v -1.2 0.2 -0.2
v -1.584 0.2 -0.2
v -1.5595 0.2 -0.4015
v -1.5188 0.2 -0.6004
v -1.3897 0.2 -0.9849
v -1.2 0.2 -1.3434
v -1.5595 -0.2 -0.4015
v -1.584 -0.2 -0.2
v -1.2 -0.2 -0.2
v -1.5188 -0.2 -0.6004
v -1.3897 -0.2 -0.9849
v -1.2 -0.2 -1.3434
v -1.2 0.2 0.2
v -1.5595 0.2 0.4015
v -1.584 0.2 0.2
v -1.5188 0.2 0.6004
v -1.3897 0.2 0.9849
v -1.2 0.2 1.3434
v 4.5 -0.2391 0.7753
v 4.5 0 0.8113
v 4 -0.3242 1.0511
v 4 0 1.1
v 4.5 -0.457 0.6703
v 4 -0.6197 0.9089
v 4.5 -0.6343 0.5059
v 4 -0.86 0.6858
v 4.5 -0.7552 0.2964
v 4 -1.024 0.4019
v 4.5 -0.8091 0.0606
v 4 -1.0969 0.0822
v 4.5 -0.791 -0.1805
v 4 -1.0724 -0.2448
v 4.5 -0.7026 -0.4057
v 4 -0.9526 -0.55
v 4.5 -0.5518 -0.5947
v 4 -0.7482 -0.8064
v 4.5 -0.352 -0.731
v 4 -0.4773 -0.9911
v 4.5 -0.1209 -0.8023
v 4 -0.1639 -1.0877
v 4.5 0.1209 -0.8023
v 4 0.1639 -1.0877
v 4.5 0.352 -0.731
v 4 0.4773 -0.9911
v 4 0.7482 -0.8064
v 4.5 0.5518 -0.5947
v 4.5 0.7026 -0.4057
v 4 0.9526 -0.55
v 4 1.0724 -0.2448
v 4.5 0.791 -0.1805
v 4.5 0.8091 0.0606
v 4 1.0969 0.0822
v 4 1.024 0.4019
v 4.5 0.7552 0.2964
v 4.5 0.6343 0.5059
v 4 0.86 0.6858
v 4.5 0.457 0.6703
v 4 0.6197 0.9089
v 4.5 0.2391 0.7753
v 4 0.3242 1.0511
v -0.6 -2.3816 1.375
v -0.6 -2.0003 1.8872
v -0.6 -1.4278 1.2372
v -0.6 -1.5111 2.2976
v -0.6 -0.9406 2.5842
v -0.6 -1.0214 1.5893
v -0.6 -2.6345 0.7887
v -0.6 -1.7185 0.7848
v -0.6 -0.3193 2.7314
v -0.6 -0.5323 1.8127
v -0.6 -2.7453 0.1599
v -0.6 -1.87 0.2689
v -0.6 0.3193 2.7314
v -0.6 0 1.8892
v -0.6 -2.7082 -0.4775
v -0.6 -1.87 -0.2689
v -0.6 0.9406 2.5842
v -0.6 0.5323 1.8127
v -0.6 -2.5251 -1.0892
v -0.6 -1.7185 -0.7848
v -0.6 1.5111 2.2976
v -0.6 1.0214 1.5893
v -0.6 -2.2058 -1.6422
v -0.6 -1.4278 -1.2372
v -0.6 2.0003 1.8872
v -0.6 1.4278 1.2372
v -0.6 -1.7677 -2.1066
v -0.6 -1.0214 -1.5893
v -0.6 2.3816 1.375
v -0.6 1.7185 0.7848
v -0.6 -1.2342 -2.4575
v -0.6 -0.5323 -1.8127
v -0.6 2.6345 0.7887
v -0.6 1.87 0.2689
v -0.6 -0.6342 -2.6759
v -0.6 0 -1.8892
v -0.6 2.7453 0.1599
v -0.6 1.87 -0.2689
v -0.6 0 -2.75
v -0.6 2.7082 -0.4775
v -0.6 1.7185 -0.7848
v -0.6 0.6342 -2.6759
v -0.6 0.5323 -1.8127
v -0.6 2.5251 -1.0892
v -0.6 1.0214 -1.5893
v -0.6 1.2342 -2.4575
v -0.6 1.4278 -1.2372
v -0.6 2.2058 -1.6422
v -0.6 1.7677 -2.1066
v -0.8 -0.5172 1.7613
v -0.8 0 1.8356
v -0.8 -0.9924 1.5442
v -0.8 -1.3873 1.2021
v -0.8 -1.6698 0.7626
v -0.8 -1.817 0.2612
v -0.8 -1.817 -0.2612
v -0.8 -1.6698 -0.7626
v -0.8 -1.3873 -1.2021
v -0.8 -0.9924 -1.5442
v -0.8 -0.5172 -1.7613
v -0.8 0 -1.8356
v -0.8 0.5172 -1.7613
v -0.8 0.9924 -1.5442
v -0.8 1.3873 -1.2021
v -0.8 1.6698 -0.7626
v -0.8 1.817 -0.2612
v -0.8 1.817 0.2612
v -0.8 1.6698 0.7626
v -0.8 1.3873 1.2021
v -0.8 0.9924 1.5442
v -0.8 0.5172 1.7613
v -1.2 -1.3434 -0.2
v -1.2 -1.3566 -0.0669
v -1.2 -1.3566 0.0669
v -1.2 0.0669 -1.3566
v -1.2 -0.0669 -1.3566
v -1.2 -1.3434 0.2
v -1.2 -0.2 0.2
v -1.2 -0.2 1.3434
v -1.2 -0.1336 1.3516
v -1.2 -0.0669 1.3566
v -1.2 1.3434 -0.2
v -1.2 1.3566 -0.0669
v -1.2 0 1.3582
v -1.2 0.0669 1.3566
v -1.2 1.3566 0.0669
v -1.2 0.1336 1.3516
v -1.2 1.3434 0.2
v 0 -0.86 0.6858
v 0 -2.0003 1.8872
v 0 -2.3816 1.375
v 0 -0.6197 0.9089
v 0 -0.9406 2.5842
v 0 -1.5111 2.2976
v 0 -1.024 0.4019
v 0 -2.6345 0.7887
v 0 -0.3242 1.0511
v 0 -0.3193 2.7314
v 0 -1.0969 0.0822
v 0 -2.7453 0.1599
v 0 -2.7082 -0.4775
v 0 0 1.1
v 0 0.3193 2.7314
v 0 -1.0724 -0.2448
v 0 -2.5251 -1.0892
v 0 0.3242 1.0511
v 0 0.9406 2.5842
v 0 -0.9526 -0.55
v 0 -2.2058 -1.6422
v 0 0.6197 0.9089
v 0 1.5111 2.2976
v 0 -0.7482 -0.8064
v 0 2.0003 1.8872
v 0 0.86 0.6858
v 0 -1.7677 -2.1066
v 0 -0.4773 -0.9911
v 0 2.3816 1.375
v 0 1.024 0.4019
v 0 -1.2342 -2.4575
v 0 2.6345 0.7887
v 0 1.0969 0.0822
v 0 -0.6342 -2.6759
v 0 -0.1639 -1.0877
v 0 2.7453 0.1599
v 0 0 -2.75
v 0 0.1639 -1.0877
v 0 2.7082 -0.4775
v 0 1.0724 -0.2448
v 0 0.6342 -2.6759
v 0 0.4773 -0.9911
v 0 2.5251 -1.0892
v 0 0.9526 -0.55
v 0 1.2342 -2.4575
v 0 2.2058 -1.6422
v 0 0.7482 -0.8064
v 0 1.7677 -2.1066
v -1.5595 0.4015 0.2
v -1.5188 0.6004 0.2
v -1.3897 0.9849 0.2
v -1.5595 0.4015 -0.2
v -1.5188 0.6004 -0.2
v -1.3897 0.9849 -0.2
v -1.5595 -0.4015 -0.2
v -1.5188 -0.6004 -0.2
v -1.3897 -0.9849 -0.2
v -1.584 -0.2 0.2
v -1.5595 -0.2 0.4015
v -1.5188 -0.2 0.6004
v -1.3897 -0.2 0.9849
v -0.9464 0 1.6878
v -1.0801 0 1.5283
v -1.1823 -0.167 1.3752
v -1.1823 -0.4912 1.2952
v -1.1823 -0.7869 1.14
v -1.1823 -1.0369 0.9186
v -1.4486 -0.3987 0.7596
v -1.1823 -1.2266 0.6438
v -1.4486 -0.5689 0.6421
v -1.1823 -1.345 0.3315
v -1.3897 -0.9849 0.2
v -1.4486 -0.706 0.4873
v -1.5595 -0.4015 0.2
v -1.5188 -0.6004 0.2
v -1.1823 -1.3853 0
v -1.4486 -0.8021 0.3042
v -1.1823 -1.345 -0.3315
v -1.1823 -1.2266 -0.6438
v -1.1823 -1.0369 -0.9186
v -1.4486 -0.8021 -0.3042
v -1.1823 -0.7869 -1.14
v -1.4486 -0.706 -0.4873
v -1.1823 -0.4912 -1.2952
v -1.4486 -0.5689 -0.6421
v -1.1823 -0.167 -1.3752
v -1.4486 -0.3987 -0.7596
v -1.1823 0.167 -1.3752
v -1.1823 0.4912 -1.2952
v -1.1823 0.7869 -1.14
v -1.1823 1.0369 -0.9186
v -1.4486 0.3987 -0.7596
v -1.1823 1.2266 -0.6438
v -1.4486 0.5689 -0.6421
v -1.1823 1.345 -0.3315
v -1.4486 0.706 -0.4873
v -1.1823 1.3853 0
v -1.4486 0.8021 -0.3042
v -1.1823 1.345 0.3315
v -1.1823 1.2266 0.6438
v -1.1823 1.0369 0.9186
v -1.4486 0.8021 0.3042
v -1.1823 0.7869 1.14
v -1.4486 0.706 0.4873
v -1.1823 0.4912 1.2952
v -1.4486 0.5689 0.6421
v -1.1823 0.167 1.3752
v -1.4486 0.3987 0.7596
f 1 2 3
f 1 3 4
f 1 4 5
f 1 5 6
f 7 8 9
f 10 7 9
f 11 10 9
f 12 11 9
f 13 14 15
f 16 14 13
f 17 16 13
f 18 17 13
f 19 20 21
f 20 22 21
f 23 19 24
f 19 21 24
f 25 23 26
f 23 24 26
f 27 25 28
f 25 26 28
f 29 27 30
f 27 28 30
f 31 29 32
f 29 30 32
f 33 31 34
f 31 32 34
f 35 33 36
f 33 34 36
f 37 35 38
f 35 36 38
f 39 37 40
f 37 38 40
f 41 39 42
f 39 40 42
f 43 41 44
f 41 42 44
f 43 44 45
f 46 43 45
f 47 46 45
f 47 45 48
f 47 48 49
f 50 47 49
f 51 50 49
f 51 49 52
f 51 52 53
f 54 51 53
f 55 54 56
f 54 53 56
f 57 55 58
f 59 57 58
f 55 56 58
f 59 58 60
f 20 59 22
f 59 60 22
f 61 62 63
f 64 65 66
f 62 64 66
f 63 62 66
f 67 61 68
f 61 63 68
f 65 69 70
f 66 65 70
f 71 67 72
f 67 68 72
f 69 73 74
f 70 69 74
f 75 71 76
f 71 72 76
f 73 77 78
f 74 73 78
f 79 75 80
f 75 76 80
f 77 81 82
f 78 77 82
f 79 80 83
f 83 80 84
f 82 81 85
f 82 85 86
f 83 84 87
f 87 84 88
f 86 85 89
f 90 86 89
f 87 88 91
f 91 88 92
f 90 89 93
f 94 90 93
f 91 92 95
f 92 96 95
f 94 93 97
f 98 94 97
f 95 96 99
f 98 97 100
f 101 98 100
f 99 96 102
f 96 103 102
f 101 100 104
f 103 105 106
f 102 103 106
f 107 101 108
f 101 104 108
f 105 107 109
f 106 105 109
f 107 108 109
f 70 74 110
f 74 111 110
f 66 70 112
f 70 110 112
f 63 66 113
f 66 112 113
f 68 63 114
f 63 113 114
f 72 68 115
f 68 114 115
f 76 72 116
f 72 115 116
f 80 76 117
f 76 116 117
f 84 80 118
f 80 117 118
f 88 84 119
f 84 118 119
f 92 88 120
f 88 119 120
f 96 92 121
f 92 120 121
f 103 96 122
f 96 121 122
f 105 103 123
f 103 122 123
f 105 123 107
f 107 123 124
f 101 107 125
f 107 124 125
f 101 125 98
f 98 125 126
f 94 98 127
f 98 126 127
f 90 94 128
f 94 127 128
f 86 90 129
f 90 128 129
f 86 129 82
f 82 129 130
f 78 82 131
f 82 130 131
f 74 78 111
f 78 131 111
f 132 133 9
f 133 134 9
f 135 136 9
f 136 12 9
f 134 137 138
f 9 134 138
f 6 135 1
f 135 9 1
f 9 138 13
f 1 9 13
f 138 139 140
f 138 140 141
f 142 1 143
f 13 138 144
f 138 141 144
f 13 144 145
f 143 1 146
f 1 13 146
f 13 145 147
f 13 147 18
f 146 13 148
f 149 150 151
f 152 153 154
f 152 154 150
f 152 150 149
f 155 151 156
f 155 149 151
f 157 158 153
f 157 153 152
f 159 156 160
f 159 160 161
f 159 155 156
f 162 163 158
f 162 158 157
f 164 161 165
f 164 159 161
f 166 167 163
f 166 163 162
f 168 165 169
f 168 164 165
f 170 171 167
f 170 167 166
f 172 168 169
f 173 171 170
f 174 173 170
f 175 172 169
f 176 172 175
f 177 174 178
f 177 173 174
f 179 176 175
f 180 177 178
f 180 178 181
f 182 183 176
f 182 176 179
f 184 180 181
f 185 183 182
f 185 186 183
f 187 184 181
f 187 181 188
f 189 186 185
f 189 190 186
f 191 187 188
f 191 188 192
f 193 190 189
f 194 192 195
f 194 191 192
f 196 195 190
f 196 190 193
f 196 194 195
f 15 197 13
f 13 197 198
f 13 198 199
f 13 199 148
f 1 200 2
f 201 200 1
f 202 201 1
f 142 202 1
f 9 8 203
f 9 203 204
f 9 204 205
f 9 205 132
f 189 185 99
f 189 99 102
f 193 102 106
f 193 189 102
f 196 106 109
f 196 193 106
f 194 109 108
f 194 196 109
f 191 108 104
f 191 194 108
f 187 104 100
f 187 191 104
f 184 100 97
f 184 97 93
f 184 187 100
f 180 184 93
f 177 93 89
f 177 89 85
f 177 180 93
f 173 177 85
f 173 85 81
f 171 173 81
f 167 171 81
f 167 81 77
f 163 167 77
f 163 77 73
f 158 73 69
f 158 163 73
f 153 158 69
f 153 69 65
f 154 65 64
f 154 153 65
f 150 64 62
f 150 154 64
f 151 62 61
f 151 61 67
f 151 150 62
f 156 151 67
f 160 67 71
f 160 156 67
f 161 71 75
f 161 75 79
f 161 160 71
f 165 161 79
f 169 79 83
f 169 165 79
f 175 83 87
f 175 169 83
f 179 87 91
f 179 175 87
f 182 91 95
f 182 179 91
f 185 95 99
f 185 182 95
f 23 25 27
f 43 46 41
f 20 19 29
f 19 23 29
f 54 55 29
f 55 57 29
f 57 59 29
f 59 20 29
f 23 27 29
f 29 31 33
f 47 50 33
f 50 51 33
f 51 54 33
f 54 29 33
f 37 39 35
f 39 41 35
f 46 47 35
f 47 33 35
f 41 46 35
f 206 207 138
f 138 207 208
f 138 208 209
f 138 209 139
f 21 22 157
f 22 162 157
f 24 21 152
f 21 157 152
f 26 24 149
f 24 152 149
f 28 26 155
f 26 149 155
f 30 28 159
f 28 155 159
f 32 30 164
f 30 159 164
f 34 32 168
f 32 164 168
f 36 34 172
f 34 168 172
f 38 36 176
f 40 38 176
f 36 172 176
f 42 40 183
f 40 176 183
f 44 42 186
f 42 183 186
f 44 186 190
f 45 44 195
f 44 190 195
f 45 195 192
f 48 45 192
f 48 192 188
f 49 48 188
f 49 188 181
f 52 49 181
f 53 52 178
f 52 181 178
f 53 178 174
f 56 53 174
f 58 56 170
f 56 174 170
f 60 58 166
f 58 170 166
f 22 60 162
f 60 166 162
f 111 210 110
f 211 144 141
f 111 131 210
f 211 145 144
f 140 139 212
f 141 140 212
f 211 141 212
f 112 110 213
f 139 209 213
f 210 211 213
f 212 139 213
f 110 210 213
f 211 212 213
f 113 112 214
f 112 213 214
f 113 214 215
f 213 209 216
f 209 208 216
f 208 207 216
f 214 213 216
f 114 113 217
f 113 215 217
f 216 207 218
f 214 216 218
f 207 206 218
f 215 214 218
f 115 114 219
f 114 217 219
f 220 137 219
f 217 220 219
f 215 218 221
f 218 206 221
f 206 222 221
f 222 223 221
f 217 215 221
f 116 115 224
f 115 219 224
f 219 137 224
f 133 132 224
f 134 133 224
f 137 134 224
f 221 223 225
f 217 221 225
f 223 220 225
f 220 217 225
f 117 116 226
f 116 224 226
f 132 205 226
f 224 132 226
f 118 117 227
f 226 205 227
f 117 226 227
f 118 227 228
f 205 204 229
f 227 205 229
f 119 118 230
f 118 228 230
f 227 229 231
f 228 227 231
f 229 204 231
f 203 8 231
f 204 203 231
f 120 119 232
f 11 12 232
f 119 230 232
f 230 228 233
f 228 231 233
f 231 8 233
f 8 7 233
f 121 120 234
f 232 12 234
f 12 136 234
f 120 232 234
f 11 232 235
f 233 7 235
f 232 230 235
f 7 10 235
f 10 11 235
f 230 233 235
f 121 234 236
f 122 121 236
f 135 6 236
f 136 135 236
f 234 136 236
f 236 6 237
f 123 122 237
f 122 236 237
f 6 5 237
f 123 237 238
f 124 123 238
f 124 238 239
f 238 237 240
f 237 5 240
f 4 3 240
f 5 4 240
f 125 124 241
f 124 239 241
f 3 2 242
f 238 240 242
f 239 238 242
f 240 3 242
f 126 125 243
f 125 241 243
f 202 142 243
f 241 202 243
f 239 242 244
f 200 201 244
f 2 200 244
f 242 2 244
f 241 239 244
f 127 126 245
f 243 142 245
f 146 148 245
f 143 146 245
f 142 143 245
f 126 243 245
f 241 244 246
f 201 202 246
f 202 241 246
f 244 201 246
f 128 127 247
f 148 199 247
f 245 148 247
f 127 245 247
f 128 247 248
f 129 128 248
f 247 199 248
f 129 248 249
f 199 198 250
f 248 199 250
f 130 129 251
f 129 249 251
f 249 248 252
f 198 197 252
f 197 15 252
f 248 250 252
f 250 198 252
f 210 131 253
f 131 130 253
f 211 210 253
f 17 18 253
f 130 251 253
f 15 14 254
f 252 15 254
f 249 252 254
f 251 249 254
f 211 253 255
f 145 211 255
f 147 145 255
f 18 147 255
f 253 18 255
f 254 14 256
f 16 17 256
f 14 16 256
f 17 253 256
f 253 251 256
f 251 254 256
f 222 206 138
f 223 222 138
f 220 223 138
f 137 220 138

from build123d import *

# Parameters (mm, degrees)
ESQUISSE2_W                  = 0.4
ESQUISSE2_H                  = 0.4
ENL_V_MAT_EXTRU_1_DEPTH      = 6.353036521
R_P_TITION_CIRCULAIRE1_COUNT = 2
R_P_TITION_CIRCULAIRE1_ANGLE = 90
ESQUISSE3_R                  = 2.75
BOSS_EXTRU_1_DEPTH           = 0.6


with BuildPart() as part:
    # Esquisse1 → Révolution1 (revolve)
    with BuildSketch(Plane.XY, mode=Mode.PRIVATE) as r_volution1_sk:
        with BuildLine():
            Line((0, 1.1), (0, 2.05))
            Line((0, 2.05), (-0.8, 1.835640646))
            ThreePointArc((-0.8, 1.835640646), (-1.391310546, 1.001196357), (-1.6, 0))
            Line((-1.6, 0), (4.5, 0))
            Line((4.5, 0), (4.5, 0.811324865))
            Line((4.5, 0.811324865), (4, 1.1))
            Line((4, 1.1), (0, 1.1))
        make_face()
    revolve(r_volution1_sk.sketch.rotate(Axis((-2.182265798, 0, 0), (1, 0, 0)), 90), axis=Axis((-2.182265798, 0, 0), (1, 0, 0)))

    # Esquisse2 → Enlèv. mat.-Extru.1 (cut, symmetric)
    with BuildSketch(Plane.XY):
        with Locations((-1.4, 0)):
            Rectangle(ESQUISSE2_W, ESQUISSE2_H)
    enl_v_mat_extru_1 = extrude(amount=ENL_V_MAT_EXTRU_1_DEPTH, both=True, mode=Mode.SUBTRACT)

    # Répétition circulaire1: Enlèv. mat.-Extru.1 ×2 about axis
    r_p_tition_circulaire1_axis = Axis((-2.182265798, 0, 0), (-1, 0, 0))
    for i in range(1, R_P_TITION_CIRCULAIRE1_COUNT):
        add(enl_v_mat_extru_1.rotate(r_p_tition_circulaire1_axis, i * R_P_TITION_CIRCULAIRE1_ANGLE / (R_P_TITION_CIRCULAIRE1_COUNT - 1)), mode=Mode.SUBTRACT)

    # Esquisse3 → Boss.-Extru.1 (add)
    with BuildSketch(Plane(origin=(0, 0, 0), x_dir=(0, 0, -1), z_dir=(1, 0, 0))):
        Circle(ESQUISSE3_R)
    extrude(amount=-BOSS_EXTRU_1_DEPTH)


solid = part.part
